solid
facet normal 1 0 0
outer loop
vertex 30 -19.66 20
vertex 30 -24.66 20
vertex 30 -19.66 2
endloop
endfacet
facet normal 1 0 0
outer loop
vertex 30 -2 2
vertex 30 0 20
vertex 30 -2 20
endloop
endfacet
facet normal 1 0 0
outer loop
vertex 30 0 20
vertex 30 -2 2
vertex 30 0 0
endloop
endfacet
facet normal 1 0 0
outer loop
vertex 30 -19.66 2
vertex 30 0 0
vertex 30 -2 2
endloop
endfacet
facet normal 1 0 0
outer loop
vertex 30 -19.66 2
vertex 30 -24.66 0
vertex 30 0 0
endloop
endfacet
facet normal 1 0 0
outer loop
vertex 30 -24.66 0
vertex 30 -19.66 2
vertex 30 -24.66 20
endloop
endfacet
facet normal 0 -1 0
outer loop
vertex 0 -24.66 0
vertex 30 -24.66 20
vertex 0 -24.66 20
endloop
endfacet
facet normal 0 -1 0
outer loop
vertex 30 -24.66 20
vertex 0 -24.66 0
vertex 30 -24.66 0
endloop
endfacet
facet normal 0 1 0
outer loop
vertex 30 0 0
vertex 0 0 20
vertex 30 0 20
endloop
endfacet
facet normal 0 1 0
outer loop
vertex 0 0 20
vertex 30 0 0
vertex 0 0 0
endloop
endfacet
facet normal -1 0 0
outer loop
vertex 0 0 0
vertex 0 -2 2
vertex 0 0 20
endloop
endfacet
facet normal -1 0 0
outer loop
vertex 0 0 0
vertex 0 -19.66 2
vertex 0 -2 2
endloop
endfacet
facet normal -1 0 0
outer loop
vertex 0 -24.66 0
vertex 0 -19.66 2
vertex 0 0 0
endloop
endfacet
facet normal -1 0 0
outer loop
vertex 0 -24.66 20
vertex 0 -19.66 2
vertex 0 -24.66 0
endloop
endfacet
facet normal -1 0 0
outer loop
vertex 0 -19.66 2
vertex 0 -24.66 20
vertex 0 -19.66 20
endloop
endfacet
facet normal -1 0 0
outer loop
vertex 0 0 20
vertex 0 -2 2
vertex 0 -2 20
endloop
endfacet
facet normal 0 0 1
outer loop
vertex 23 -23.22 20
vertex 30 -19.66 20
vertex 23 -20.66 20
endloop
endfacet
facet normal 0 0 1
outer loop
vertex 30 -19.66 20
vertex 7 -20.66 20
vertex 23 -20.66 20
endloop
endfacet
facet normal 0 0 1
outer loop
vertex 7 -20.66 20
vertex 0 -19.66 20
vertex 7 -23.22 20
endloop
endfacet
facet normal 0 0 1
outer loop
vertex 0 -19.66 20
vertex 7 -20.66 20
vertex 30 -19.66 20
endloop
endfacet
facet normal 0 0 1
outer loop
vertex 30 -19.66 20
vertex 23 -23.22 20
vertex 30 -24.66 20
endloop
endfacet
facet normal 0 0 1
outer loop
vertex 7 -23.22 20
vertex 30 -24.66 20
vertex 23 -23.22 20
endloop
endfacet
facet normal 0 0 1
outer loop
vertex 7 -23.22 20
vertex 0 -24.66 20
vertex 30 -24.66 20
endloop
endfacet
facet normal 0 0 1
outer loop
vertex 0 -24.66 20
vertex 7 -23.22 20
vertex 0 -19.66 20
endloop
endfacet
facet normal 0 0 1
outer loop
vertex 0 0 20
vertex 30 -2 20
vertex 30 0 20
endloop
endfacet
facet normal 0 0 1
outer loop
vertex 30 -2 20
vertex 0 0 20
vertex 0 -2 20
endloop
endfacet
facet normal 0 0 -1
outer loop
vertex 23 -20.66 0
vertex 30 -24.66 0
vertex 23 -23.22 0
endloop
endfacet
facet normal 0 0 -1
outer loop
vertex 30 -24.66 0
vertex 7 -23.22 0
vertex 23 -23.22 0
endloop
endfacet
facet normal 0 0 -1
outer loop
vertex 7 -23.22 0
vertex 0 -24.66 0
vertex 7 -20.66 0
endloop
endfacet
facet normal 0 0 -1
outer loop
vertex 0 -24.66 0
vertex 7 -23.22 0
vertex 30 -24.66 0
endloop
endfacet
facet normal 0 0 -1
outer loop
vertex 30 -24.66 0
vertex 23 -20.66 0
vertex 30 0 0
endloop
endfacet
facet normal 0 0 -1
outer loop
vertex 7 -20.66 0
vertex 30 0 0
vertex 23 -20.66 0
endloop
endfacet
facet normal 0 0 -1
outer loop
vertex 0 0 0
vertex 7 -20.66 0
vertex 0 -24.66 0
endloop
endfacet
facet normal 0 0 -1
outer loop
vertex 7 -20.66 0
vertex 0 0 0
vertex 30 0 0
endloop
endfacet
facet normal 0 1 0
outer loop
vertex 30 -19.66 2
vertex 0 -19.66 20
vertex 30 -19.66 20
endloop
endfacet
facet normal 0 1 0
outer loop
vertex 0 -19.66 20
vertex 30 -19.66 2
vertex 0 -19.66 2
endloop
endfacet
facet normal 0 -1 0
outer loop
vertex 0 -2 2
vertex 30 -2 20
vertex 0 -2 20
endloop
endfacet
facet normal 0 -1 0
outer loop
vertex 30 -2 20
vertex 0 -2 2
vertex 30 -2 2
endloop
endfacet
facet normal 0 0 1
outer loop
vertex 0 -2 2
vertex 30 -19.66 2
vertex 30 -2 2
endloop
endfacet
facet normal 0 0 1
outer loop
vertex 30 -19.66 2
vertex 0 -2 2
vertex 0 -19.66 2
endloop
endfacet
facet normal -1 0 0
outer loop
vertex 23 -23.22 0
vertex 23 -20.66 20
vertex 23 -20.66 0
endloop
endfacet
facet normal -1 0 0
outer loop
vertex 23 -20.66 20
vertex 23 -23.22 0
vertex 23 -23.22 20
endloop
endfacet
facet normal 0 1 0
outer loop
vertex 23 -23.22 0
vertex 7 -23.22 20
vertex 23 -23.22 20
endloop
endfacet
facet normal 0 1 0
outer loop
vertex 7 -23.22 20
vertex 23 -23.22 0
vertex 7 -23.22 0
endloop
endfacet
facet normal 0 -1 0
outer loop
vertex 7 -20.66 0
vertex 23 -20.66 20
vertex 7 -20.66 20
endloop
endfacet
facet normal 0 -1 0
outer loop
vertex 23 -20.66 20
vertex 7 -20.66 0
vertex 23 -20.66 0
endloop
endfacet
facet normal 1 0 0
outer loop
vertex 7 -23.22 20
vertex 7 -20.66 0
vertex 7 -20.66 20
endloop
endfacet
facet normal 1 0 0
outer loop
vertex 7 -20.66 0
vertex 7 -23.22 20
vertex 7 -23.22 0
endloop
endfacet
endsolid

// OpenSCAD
// Shelf Camera Clip
// Hari Wiguna, 2014

clipWidth = 30;
clipDepth = 20;
clipTopThick = 5;
clipBottomThick = 2;
clipFrontThick = 2;

// Thickness of the shelf where we would clip this onto
shelfThick = 17.66;

// Slit where the angle bracket slides into
slitHeight = 2.56;
slitWidth = 16;

blockHeight = clipTopThick + shelfThick + clipBottomThick;

rotate([90,0,0])
difference()
{
	// ClipBlock
	cube([clipWidth, clipDepth, blockHeight]);

	// Opening for the shelf where we would clip this onto
	translate([0,clipFrontThick,clipBottomThick]) cube([clipWidth, clipDepth, shelfThick]);

	// Slit for the angle bracket
	translate([(clipWidth-slitWidth)/2, 0, clipBottomThick+shelfThick+1]) cube([slitWidth, clipDepth, slitHeight]);
}
